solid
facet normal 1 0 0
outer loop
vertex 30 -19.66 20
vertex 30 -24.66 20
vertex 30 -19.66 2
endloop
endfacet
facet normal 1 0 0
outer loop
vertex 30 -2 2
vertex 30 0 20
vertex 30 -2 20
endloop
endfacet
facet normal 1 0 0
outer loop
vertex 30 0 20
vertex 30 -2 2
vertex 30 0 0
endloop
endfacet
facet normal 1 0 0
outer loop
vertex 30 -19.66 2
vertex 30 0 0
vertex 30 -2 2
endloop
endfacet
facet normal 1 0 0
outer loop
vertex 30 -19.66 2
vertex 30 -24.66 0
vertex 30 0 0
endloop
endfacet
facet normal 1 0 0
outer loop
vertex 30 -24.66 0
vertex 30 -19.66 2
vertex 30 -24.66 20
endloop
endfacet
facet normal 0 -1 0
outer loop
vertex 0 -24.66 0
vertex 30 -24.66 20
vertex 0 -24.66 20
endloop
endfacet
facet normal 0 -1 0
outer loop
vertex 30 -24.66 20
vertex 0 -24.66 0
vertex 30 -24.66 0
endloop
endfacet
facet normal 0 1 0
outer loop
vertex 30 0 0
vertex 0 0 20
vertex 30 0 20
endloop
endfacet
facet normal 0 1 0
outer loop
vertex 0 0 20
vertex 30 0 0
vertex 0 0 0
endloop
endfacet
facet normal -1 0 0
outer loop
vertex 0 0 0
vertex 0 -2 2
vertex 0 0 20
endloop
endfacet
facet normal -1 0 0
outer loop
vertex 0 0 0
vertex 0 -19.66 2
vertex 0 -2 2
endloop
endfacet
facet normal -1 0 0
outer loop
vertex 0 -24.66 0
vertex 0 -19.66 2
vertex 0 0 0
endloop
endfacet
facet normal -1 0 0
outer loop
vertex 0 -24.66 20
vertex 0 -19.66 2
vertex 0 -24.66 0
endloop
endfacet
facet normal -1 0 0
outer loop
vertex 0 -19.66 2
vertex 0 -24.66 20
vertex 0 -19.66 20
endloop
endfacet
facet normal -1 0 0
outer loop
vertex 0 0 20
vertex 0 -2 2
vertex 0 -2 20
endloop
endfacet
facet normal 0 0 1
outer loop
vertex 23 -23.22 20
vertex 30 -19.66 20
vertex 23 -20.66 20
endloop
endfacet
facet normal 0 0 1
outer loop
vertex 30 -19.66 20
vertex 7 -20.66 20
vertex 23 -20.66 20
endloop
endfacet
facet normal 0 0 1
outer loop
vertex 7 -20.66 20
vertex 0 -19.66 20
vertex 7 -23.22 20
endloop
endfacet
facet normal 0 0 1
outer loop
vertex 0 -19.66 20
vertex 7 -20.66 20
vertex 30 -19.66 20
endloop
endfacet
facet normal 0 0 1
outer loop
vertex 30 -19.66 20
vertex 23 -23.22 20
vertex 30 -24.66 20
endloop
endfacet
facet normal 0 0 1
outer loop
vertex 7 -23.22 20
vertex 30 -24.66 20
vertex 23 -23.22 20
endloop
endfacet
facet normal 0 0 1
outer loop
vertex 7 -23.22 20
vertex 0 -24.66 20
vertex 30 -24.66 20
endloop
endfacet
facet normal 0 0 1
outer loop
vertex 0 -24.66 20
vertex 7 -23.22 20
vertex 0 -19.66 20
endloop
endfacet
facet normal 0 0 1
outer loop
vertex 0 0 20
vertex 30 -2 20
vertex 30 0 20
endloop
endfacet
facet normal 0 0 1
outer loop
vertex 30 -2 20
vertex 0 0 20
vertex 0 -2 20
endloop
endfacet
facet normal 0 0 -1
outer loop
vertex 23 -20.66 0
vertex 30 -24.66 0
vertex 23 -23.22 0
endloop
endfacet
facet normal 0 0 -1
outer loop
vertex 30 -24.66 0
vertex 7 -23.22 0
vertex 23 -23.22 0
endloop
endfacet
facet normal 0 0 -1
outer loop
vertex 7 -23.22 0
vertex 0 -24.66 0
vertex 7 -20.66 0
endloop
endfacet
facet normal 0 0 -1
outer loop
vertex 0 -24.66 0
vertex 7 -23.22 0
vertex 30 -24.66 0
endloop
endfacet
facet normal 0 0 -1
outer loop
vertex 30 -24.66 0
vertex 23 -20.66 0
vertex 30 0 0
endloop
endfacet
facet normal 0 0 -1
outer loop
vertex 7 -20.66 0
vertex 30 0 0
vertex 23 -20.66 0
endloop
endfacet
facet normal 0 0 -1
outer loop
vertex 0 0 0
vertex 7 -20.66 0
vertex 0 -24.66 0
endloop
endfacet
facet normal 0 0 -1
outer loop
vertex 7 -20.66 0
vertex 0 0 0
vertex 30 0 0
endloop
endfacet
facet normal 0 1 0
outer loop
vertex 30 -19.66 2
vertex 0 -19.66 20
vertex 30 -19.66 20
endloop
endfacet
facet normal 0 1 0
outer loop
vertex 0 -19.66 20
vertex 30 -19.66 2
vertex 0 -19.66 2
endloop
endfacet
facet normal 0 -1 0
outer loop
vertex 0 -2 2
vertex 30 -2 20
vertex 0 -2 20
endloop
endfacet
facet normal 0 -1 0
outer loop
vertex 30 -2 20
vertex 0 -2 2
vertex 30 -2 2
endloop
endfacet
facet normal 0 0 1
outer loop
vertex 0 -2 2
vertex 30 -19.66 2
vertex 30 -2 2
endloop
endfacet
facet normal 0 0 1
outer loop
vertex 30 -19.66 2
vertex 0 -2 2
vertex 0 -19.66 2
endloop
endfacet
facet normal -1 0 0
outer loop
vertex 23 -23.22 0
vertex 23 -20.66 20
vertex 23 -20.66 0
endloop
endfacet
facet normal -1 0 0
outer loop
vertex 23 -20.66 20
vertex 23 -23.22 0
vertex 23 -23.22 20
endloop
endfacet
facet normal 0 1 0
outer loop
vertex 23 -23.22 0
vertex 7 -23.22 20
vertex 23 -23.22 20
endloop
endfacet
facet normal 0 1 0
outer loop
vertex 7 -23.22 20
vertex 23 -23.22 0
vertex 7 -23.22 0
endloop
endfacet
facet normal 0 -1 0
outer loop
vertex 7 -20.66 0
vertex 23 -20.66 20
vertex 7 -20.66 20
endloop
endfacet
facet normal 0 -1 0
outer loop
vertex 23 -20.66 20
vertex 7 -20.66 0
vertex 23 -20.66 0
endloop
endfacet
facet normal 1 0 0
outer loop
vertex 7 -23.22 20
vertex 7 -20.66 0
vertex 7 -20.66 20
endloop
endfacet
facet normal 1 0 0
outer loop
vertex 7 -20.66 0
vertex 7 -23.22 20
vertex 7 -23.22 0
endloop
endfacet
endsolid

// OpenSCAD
// Shelf Camera Clip
// Hari Wiguna, 2014

clipWidth = 30;
clipDepth = 20;
clipTopThick = 5;
clipBottomThick = 2;
clipFrontThick = 2;

// Thickness of the shelf where we would clip this onto
shelfThick = 17.66;

// Slit where the angle bracket slides into
slitHeight = 2.56;
slitWidth = 16;

blockHeight = clipTopThick + shelfThick + clipBottomThick;

rotate([90,0,0])
difference()
{
	// ClipBlock
	cube([clipWidth, clipDepth, blockHeight]);

	// Opening for the shelf where we would clip this onto
	translate([0,clipFrontThick,clipBottomThick]) cube([clipWidth, clipDepth, shelfThick]);

	// Slit for the angle bracket
	translate([(clipWidth-slitWidth)/2, 0, clipBottomThick+shelfThick+1]) cube([slitWidth, clipDepth, slitHeight]);
}
